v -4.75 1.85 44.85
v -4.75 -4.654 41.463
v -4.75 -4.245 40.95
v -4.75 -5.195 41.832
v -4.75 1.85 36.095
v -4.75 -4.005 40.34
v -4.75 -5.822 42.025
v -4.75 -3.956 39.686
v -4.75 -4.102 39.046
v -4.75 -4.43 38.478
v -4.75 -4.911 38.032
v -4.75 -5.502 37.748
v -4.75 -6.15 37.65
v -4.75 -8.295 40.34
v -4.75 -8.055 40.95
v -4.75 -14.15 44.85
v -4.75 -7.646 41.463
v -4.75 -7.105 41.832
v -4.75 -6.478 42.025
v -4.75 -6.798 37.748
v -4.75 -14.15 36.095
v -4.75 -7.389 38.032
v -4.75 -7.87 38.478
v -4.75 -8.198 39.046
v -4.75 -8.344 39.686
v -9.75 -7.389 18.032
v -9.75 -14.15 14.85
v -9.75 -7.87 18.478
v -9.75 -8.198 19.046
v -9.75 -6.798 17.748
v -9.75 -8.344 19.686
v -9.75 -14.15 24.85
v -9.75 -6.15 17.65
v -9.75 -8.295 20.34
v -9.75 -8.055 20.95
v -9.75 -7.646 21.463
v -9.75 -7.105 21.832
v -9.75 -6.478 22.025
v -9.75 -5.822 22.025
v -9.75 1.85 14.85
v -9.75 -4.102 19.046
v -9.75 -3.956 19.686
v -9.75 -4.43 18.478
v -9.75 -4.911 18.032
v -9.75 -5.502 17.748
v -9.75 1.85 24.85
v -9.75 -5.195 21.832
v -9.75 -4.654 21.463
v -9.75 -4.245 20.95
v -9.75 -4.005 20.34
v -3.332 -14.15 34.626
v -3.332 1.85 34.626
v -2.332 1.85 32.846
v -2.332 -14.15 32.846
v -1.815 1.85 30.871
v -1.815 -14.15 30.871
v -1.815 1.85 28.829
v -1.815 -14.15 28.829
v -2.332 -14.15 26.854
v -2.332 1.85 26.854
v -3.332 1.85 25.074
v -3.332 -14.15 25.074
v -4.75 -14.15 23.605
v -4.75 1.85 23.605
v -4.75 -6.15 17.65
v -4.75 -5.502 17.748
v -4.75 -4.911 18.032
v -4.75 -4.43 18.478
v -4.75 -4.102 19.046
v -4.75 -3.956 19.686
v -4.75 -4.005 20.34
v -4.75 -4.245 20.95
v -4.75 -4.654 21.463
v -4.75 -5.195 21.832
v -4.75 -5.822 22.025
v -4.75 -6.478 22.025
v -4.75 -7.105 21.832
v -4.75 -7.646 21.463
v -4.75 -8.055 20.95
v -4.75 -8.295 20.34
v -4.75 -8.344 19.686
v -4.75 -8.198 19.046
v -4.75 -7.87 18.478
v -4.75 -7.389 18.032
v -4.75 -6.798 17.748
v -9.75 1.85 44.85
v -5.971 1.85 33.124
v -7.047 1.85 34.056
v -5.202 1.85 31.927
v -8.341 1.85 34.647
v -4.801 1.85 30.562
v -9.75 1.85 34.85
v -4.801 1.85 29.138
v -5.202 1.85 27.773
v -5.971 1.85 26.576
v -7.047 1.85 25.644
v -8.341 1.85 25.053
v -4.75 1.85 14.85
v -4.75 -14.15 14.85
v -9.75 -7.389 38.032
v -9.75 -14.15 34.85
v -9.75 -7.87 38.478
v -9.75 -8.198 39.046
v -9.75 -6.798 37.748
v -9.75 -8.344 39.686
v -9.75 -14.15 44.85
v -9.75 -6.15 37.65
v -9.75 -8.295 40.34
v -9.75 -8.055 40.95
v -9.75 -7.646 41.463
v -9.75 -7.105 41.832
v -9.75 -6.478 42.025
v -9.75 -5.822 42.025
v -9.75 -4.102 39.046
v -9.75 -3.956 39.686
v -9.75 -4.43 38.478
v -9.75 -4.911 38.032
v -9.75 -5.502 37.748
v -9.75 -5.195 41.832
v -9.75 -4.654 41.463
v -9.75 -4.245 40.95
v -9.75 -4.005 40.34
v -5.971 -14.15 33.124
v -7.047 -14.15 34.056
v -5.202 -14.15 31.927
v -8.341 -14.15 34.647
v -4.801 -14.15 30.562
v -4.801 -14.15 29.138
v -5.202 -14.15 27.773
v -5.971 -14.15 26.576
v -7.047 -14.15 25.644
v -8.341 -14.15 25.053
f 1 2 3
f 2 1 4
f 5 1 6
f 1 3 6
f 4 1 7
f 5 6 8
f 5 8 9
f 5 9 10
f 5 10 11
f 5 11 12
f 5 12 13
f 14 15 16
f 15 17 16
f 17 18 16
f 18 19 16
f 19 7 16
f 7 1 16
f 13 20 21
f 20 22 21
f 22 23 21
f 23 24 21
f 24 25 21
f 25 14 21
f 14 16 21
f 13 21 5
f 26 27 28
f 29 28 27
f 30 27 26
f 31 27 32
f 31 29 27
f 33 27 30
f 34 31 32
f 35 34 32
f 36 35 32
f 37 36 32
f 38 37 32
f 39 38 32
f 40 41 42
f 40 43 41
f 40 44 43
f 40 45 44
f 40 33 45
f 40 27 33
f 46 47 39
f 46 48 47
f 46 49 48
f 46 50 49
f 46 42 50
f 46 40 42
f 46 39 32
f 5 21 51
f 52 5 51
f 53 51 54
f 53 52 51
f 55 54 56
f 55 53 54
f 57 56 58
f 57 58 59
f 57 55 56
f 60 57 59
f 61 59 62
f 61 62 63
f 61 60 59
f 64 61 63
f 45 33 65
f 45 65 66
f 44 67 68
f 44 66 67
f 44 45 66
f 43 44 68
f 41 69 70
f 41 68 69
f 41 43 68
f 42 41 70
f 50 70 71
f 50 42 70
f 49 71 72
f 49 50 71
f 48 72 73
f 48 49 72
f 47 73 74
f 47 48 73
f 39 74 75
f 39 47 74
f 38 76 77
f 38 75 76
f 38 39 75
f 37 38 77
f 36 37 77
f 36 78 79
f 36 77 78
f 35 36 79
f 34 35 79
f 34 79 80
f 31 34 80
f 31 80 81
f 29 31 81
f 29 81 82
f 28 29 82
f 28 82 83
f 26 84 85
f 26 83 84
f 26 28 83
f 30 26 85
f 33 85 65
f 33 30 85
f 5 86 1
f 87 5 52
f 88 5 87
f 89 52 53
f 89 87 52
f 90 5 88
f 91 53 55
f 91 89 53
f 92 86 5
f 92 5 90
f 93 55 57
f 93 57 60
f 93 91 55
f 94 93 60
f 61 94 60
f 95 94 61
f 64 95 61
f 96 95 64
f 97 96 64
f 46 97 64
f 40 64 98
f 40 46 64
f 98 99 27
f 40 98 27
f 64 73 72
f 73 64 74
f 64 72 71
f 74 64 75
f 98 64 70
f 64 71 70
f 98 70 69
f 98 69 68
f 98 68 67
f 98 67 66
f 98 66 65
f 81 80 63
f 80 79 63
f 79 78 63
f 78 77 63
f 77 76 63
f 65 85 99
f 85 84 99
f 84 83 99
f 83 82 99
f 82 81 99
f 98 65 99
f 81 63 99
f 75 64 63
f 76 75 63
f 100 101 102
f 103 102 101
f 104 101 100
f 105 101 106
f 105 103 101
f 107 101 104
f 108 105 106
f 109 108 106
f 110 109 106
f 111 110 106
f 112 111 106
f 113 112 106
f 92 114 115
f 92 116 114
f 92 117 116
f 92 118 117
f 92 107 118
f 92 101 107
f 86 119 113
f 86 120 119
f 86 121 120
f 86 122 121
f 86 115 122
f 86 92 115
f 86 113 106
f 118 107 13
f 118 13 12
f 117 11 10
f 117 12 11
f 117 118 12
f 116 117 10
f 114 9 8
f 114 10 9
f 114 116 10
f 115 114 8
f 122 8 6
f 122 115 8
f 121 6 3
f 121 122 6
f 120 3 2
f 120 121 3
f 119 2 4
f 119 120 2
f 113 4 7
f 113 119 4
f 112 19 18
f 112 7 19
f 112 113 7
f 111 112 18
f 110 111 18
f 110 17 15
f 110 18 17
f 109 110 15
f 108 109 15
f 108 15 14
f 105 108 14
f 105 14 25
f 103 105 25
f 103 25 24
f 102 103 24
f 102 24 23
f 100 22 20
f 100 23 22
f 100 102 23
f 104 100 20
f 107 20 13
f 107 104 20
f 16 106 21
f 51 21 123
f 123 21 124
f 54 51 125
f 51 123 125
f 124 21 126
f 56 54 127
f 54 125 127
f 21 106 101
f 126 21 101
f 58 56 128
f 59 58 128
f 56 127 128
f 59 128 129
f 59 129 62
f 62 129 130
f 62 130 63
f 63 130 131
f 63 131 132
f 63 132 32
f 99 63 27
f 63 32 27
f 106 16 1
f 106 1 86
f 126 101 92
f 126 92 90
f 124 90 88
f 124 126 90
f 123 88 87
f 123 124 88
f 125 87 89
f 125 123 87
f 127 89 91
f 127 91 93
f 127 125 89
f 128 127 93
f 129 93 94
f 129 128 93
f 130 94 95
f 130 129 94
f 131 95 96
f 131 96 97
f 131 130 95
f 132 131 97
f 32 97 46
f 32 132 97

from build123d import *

# Parameters (mm, degrees)
CYLINDER070_R          = 2.2
CYLINDER070_DEPTH      = 20
CYLINDER069_R          = 2.2
CYLINDER069_DEPTH      = 20
CYLINDER068_R          = 5
CYLINDER068_DEPTH      = 16
CYLINDER065_W          = 8
CYLINDER065_H          = 16
CYLINDER065_ANGLE      = 180
BOX052_W               = 30
BOX052_H               = 5
BOX052_DEPTH           = 16
CUT076_PITCH_ANGLE     = 90
CUT076_PLACEMENT_ANGLE = 90


with BuildPart() as zylinder059:
    # Cylinder070 → Cylinder070 (new body)
    with BuildSketch(Plane(origin=(10, 9, 8), x_dir=(1, 0, 0), z_dir=(0, -1, 0))):
        Circle(CYLINDER070_R)
    extrude(amount=CYLINDER070_DEPTH)


with BuildPart() as zylinder058:
    # Cylinder069 → Cylinder069 (new body)
    with BuildSketch(Plane(origin=(-10, 9, 8), x_dir=(1, 0, 0), z_dir=(0, -1, 0))):
        Circle(CYLINDER069_R)
    extrude(amount=CYLINDER069_DEPTH)


with BuildPart() as zylinder057:
    # Cylinder068 → Cylinder068 (new body)
    with BuildSketch(Plane.XY):
        Circle(CYLINDER068_R)
    extrude(amount=CYLINDER068_DEPTH)


with BuildPart() as zylinder054:
    # Cylinder065 → Cylinder065 (revolve)
    with BuildSketch(Plane(origin=(0, 0, 0), x_dir=(-1, 0, 0), z_dir=(0, 1, 0))):
        with Locations((4, 8)):
            Rectangle(CYLINDER065_W, CYLINDER065_H)
    revolve(axis=Axis((0, 0, 0), (0, 0, 1)), revolution_arc=CYLINDER065_ANGLE)


with BuildPart() as y_mount_top:
    # Box052 → Box052 (new body)
    with BuildSketch(Plane(origin=(-15, -5, 0), x_dir=(1, 0, 0), z_dir=(0, 0, 1))):
        with Locations((15, 2.5)):
            Rectangle(BOX052_W, BOX052_H)
    extrude(amount=BOX052_DEPTH)

    # Fusion035: union Zylinder054
    add(zylinder054.part)

    # Cut072: cut Zylinder057
    add(zylinder057.part, mode=Mode.SUBTRACT)

    # Cut075: cut Zylinder058
    add(zylinder058.part, mode=Mode.SUBTRACT)

    # Cut076: cut Zylinder059
    add(zylinder059.part, mode=Mode.SUBTRACT)


with BuildPart() as y_mount_top_1:
    # Cut076 pitch: moved
    add(y_mount_top.part.rotate(Axis((0, 0, 0), (0, 1, 0)), CUT076_PITCH_ANGLE))


with BuildPart() as y_mount_top_2:
    # Cut076 placement: moved
    add(y_mount_top_1.part.moved(Location((-9.75, -14.15, 29.85))).rotate(Axis((-9.75, -14.15, 29.85), (0, 0, 1)), CUT076_PLACEMENT_ANGLE))


solid = y_mount_top_2.part
